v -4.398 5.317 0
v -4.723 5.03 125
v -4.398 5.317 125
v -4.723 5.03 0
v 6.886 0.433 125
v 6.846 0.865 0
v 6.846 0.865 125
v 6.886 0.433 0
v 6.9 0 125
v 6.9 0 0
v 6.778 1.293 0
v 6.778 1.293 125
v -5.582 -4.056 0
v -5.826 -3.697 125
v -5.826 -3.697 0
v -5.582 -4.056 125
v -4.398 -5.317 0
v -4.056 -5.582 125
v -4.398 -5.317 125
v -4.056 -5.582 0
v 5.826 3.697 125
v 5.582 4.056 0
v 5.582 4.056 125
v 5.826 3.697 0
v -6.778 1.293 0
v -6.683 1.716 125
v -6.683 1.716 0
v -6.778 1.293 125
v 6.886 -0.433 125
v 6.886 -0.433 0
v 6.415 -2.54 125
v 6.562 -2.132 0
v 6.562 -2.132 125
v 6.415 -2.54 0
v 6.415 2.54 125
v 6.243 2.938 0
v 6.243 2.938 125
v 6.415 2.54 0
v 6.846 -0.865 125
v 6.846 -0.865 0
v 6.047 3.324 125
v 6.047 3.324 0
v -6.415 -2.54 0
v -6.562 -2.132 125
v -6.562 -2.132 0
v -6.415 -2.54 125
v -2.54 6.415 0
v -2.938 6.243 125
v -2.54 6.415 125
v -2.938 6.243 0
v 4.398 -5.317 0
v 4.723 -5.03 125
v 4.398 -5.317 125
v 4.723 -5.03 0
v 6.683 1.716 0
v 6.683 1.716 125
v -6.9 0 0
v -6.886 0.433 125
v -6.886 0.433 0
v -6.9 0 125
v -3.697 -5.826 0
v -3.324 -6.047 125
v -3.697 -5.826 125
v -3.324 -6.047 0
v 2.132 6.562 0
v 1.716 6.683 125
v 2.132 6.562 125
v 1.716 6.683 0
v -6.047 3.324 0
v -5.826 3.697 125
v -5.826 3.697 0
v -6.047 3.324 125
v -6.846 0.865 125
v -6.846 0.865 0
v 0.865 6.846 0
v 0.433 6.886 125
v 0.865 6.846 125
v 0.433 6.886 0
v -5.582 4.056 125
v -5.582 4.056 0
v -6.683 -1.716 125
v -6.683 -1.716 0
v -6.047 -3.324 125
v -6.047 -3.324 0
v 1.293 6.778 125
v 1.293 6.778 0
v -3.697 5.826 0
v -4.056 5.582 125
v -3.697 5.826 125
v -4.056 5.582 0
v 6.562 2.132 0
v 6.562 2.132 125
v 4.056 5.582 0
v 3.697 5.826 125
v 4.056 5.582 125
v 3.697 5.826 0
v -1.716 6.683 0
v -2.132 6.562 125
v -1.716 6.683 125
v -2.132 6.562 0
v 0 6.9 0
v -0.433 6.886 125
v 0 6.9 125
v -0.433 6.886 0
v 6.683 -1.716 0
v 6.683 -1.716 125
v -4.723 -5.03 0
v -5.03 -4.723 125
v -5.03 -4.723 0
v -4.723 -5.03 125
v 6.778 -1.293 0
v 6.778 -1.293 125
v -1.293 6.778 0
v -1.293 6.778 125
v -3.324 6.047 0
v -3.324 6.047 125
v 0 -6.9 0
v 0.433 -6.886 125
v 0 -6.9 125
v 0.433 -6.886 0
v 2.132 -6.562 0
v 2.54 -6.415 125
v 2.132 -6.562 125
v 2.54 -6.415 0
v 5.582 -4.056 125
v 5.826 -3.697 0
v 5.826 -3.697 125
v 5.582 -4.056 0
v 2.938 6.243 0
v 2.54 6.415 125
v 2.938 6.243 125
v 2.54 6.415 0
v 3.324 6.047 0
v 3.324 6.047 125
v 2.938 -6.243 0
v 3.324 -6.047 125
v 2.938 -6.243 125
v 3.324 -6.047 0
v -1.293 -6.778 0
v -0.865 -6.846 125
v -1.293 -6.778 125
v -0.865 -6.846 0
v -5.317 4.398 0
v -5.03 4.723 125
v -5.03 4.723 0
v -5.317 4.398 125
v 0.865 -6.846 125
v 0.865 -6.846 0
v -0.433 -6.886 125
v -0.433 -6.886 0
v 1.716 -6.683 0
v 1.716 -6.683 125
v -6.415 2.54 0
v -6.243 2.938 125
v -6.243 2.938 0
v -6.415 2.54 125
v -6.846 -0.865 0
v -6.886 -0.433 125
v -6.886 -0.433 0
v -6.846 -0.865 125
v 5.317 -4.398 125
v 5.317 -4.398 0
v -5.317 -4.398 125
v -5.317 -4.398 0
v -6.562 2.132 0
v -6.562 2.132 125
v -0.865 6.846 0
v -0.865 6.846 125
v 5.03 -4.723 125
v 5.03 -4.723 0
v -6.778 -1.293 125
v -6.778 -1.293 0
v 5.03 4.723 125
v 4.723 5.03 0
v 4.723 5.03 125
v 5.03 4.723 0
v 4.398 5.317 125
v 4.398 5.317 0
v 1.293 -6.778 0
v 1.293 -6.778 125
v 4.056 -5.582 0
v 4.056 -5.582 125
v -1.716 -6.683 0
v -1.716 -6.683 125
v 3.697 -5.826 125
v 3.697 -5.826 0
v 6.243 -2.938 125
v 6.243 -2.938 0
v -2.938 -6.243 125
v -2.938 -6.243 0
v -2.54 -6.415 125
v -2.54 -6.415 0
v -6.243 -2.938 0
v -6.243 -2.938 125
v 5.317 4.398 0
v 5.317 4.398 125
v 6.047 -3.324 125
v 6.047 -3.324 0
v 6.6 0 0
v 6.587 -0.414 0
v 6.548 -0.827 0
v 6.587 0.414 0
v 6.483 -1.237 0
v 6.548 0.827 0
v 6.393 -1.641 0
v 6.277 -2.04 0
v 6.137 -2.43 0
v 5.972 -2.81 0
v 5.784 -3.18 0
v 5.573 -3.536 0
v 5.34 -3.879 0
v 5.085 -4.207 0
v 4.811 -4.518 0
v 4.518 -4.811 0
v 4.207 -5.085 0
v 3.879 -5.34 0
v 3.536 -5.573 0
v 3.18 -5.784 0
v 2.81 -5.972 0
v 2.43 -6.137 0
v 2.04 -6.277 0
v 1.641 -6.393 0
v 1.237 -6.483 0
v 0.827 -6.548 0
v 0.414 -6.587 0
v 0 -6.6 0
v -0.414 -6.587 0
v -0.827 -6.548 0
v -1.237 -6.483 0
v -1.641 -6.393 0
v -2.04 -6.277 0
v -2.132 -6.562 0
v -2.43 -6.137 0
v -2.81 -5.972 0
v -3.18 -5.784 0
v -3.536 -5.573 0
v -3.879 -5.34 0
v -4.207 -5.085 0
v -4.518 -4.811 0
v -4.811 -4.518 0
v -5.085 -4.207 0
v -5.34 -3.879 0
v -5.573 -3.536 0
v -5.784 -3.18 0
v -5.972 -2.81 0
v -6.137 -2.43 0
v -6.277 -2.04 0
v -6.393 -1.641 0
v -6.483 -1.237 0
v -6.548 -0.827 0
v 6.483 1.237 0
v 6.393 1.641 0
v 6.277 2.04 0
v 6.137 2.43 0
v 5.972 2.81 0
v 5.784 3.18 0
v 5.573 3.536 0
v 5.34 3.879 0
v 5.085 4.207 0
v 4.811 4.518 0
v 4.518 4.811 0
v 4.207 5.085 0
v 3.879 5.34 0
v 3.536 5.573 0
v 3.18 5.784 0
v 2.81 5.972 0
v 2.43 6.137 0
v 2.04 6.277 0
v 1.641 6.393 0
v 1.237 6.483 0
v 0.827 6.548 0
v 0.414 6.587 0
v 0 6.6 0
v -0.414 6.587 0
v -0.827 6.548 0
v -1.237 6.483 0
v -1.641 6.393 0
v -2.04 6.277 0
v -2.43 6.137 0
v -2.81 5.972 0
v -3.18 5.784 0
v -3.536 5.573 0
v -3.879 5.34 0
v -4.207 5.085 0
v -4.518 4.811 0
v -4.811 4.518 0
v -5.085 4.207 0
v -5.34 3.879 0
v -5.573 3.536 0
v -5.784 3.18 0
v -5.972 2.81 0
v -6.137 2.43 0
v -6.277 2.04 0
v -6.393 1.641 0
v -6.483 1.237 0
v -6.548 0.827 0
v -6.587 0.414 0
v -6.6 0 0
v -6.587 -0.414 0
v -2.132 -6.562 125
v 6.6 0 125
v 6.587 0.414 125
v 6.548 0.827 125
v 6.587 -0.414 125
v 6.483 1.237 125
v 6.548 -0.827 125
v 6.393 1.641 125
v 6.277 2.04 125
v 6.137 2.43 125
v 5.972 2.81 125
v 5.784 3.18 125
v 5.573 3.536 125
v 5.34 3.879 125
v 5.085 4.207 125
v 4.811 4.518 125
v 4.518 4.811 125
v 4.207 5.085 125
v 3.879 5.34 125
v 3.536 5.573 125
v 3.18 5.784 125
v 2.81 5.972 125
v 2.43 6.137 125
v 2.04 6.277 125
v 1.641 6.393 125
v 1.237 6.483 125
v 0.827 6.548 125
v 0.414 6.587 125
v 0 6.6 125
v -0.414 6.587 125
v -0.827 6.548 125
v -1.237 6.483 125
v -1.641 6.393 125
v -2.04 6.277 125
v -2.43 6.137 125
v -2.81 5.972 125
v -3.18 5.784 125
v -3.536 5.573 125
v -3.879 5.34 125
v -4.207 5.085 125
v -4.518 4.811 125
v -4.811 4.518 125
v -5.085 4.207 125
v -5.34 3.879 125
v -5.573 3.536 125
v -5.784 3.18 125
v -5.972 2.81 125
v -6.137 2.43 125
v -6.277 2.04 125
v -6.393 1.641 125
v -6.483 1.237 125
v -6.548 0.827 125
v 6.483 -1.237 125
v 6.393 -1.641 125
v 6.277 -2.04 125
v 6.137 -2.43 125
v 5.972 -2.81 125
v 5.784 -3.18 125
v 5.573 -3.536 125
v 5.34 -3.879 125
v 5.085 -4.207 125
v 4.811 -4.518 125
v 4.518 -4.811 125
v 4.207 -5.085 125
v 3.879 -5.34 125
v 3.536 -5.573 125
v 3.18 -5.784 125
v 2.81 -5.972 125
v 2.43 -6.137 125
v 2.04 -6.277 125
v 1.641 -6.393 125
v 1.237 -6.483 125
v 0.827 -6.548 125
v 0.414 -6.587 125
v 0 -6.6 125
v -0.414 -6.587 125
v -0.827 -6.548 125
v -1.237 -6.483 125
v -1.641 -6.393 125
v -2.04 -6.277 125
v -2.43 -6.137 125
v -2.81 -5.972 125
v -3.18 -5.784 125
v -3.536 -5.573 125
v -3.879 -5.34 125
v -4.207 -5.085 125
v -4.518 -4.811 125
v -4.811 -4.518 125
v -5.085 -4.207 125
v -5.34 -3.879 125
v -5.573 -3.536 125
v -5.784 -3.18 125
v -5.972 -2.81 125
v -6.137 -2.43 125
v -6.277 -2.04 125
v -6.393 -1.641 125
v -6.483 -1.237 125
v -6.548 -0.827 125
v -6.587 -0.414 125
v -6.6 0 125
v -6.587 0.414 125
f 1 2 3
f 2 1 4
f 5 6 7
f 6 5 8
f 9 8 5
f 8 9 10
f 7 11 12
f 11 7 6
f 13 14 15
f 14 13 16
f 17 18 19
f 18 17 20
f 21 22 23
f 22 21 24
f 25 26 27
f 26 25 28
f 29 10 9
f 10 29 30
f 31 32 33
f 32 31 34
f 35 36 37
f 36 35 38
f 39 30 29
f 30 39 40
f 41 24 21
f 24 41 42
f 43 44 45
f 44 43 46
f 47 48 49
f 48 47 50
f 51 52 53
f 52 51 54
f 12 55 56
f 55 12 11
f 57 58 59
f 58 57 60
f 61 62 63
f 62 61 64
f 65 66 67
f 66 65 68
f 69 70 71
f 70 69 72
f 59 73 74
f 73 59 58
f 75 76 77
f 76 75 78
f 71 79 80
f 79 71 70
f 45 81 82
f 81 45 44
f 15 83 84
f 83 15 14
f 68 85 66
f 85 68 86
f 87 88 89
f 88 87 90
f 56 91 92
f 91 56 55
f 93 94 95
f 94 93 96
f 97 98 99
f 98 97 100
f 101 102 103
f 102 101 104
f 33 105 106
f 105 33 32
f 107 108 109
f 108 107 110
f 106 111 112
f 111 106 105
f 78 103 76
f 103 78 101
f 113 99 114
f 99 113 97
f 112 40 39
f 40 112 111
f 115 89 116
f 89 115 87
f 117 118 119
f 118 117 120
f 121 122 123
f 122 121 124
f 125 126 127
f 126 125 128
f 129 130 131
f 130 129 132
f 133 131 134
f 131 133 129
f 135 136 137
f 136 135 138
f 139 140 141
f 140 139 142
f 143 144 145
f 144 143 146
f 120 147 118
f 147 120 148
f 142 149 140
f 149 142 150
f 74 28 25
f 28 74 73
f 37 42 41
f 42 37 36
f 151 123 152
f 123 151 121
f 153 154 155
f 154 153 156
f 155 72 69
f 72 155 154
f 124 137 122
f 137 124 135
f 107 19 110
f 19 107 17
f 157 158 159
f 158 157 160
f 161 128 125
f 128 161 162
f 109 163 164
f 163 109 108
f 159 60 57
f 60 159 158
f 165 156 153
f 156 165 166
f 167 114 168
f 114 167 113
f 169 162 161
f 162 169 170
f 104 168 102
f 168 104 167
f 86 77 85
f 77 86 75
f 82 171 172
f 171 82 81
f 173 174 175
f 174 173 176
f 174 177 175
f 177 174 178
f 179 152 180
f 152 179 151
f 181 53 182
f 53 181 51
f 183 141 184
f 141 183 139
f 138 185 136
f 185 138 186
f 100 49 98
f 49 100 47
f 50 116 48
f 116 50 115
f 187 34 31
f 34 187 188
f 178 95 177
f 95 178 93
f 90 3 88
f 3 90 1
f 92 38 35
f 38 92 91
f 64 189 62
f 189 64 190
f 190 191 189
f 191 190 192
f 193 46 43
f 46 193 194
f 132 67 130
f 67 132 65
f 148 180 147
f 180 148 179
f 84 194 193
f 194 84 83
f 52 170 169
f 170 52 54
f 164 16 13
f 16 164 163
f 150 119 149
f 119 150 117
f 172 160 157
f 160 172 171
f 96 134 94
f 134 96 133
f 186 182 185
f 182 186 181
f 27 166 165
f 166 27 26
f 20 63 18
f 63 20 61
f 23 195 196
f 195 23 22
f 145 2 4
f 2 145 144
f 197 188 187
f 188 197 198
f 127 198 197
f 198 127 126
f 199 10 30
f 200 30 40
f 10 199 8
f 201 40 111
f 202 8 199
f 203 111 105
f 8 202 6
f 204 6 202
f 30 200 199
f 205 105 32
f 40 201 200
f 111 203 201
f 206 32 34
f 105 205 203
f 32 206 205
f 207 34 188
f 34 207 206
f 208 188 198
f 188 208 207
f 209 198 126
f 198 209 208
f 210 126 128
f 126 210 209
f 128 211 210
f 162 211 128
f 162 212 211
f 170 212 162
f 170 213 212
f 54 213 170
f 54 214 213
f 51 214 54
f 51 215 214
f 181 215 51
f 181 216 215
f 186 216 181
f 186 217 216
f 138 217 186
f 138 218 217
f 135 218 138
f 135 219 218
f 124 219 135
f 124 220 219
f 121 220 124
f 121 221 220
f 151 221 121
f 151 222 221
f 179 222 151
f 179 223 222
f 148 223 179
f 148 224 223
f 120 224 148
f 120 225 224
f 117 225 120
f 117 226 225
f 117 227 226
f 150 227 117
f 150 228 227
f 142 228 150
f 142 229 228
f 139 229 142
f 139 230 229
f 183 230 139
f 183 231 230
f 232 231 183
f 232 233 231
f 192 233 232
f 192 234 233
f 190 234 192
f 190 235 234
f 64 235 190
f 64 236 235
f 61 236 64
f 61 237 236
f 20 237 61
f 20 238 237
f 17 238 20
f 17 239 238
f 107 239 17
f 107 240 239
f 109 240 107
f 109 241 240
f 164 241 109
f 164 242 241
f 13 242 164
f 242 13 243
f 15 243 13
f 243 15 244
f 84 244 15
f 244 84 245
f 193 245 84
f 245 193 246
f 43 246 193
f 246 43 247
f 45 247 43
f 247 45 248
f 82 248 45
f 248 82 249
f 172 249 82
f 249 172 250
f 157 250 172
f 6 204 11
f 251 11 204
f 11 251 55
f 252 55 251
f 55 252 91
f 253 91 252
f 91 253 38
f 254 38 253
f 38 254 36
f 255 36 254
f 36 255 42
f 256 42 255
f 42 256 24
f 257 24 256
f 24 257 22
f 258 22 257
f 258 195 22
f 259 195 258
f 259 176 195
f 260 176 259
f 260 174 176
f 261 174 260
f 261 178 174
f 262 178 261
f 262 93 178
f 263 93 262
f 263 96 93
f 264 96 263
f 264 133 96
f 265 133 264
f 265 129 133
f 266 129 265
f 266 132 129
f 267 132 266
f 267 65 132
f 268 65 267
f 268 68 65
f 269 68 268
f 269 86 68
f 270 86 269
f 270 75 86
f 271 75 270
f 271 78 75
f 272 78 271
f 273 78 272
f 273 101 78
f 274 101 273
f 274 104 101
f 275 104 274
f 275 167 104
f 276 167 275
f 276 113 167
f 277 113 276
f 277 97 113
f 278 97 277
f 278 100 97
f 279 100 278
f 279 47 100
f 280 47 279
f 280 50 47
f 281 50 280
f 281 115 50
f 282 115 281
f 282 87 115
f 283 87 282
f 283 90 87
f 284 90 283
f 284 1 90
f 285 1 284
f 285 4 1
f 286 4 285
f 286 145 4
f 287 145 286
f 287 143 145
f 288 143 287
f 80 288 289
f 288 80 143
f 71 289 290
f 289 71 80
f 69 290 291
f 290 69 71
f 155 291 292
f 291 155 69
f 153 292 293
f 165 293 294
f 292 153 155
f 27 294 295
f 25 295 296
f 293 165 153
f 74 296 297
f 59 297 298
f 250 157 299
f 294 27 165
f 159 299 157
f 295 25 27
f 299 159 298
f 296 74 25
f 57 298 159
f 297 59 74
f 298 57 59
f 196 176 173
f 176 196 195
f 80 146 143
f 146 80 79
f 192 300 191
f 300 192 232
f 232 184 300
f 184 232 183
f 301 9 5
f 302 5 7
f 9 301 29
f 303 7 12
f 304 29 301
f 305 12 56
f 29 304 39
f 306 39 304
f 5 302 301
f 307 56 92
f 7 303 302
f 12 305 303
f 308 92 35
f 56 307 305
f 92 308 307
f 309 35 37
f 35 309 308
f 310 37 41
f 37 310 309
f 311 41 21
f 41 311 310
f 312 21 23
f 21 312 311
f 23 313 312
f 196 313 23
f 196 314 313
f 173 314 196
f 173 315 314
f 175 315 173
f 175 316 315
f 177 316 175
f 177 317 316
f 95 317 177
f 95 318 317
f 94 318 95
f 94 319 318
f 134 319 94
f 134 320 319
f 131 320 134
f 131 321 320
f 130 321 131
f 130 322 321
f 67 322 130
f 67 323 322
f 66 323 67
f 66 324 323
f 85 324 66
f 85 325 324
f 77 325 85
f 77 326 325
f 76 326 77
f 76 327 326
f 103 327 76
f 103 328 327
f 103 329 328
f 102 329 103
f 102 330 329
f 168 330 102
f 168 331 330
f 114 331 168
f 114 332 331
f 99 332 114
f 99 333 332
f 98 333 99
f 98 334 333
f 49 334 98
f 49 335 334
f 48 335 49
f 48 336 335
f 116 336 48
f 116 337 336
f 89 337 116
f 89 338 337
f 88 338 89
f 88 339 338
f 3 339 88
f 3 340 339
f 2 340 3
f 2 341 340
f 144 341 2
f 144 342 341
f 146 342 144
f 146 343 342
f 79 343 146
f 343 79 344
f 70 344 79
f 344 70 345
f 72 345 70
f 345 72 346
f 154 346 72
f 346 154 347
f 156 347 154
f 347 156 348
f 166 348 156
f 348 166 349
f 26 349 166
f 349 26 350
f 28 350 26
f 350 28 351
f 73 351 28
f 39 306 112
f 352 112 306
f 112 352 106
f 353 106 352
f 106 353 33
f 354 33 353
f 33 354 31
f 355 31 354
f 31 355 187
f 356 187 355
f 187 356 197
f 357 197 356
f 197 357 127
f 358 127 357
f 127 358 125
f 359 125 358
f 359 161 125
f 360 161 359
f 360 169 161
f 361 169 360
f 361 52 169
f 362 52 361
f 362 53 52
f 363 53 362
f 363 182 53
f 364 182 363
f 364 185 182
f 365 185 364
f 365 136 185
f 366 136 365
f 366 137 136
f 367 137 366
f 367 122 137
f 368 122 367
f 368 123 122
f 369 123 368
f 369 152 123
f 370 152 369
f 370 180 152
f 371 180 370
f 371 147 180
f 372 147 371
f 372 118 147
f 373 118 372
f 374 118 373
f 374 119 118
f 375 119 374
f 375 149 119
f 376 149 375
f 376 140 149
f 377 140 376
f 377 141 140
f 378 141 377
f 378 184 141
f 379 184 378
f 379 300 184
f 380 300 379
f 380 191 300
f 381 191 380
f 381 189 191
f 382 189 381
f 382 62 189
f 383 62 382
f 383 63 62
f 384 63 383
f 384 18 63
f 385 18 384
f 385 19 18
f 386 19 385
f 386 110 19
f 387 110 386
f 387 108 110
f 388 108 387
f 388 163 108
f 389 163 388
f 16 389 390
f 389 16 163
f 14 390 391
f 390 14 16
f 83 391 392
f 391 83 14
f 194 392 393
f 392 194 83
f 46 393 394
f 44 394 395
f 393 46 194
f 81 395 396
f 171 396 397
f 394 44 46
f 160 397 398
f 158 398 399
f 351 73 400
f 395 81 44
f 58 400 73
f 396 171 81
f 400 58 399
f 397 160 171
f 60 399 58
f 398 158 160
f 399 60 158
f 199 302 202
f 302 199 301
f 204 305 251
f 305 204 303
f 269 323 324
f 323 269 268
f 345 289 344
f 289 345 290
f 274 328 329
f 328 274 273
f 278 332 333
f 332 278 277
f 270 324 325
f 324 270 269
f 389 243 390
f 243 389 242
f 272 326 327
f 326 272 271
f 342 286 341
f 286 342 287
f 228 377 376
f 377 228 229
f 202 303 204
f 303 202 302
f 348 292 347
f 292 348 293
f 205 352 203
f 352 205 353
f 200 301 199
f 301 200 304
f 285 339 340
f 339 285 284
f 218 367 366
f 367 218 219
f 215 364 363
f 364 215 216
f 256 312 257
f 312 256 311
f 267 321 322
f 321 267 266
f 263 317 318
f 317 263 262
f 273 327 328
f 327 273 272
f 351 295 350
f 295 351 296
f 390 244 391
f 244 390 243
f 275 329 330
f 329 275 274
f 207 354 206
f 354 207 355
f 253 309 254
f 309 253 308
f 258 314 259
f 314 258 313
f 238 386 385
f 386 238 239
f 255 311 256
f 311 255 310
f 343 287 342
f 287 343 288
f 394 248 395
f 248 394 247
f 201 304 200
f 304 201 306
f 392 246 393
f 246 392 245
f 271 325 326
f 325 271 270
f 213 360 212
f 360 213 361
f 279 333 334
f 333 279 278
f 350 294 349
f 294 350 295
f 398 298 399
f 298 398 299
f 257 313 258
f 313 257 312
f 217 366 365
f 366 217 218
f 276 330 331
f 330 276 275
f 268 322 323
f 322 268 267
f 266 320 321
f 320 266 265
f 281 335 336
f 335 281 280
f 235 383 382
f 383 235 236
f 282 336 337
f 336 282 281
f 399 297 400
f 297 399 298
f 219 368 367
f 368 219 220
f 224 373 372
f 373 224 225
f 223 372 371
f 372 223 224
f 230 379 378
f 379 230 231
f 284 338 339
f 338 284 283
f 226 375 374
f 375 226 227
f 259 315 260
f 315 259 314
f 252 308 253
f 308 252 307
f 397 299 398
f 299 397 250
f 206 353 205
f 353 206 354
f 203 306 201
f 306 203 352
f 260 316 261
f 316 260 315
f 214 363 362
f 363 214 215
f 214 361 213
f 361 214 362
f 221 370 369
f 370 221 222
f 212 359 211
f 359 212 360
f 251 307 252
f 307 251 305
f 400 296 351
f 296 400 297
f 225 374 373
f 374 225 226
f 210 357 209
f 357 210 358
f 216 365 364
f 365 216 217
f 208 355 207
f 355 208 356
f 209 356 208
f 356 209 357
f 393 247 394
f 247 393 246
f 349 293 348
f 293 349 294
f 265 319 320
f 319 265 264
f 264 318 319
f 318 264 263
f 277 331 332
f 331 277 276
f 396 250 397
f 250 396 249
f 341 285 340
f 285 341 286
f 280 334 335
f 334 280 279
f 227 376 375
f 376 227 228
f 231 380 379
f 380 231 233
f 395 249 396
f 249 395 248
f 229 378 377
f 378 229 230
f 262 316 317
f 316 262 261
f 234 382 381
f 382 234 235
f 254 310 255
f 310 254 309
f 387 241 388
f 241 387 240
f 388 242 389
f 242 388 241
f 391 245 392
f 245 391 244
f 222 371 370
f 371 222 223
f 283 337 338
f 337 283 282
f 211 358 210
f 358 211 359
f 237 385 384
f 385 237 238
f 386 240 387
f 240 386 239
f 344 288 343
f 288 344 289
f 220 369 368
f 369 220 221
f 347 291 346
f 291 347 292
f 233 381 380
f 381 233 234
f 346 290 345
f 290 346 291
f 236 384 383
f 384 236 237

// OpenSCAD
tube_size = 13.8; //[13.8:BT-5, 18.7:BT-20, 24.8:BT-50, 33.7:BT-55, 34.2:BT-56, 41.6:BT-60, 56.3:BT-70, 66.04:BT-80, 100:BT-101]

//How long do you want the tube to be (mm)?
length = 125;

if (tube_size==13.8) {
difference(){
cylinder(h=length, r=13.8/2, center=false, $fn=100);
    cylinder (h=length, r=13.2/2, center=false, $fn=100);
}
}

if (tube_size==18.7) {
difference(){
cylinder(h=length, r=18.7/2, center=false, $fn=100);
    cylinder (h=length, r=18/2, center=false, $fn=100);
}
}

if (tube_size==24.8) {
difference(){
cylinder(h=length, r=24.8/2, center=false, $fn=100);
    cylinder (h=length, r=24.1/2, center=false, $fn=100);
}
}

if (tube_size==33.7) {
difference(){
cylinder(h=length, r=33.7/2, center=false, $fn=100);
    cylinder (h=length, r=32.6/2, center=false, $fn=100);
}
}

if (tube_size==34.2) {
difference(){
cylinder(h=length, r=34.2/2, center=false, $fn=100);
    cylinder (h=length, r=33.1/2, center=false, $fn=100);
}
}

if (tube_size==41.6) {
difference(){
cylinder(h=length, r=41.6/2, center=false, $fn=100);
    cylinder (h=length, r=40.5/2, center=false, $fn=100);
}
}

if (tube_size==56.3) {
difference(){
cylinder(h=length, r=56.3/2, center=false, $fn=100);
    cylinder (h=length, r=55.4/2, center=false, $fn=100);
}
}

if (tube_size==66.04) {
difference(){
cylinder(h=length, r=66.04/2, center=false, $fn=100);
    cylinder (h=length, r=65.7/2, center=false, $fn=100);
}
}

if (tube_size==100) {
difference(){
cylinder(h=length, r=100/2, center=false, $fn=100);
    cylinder (h=length, r=99/2, center=false, $fn=100);
}
}
